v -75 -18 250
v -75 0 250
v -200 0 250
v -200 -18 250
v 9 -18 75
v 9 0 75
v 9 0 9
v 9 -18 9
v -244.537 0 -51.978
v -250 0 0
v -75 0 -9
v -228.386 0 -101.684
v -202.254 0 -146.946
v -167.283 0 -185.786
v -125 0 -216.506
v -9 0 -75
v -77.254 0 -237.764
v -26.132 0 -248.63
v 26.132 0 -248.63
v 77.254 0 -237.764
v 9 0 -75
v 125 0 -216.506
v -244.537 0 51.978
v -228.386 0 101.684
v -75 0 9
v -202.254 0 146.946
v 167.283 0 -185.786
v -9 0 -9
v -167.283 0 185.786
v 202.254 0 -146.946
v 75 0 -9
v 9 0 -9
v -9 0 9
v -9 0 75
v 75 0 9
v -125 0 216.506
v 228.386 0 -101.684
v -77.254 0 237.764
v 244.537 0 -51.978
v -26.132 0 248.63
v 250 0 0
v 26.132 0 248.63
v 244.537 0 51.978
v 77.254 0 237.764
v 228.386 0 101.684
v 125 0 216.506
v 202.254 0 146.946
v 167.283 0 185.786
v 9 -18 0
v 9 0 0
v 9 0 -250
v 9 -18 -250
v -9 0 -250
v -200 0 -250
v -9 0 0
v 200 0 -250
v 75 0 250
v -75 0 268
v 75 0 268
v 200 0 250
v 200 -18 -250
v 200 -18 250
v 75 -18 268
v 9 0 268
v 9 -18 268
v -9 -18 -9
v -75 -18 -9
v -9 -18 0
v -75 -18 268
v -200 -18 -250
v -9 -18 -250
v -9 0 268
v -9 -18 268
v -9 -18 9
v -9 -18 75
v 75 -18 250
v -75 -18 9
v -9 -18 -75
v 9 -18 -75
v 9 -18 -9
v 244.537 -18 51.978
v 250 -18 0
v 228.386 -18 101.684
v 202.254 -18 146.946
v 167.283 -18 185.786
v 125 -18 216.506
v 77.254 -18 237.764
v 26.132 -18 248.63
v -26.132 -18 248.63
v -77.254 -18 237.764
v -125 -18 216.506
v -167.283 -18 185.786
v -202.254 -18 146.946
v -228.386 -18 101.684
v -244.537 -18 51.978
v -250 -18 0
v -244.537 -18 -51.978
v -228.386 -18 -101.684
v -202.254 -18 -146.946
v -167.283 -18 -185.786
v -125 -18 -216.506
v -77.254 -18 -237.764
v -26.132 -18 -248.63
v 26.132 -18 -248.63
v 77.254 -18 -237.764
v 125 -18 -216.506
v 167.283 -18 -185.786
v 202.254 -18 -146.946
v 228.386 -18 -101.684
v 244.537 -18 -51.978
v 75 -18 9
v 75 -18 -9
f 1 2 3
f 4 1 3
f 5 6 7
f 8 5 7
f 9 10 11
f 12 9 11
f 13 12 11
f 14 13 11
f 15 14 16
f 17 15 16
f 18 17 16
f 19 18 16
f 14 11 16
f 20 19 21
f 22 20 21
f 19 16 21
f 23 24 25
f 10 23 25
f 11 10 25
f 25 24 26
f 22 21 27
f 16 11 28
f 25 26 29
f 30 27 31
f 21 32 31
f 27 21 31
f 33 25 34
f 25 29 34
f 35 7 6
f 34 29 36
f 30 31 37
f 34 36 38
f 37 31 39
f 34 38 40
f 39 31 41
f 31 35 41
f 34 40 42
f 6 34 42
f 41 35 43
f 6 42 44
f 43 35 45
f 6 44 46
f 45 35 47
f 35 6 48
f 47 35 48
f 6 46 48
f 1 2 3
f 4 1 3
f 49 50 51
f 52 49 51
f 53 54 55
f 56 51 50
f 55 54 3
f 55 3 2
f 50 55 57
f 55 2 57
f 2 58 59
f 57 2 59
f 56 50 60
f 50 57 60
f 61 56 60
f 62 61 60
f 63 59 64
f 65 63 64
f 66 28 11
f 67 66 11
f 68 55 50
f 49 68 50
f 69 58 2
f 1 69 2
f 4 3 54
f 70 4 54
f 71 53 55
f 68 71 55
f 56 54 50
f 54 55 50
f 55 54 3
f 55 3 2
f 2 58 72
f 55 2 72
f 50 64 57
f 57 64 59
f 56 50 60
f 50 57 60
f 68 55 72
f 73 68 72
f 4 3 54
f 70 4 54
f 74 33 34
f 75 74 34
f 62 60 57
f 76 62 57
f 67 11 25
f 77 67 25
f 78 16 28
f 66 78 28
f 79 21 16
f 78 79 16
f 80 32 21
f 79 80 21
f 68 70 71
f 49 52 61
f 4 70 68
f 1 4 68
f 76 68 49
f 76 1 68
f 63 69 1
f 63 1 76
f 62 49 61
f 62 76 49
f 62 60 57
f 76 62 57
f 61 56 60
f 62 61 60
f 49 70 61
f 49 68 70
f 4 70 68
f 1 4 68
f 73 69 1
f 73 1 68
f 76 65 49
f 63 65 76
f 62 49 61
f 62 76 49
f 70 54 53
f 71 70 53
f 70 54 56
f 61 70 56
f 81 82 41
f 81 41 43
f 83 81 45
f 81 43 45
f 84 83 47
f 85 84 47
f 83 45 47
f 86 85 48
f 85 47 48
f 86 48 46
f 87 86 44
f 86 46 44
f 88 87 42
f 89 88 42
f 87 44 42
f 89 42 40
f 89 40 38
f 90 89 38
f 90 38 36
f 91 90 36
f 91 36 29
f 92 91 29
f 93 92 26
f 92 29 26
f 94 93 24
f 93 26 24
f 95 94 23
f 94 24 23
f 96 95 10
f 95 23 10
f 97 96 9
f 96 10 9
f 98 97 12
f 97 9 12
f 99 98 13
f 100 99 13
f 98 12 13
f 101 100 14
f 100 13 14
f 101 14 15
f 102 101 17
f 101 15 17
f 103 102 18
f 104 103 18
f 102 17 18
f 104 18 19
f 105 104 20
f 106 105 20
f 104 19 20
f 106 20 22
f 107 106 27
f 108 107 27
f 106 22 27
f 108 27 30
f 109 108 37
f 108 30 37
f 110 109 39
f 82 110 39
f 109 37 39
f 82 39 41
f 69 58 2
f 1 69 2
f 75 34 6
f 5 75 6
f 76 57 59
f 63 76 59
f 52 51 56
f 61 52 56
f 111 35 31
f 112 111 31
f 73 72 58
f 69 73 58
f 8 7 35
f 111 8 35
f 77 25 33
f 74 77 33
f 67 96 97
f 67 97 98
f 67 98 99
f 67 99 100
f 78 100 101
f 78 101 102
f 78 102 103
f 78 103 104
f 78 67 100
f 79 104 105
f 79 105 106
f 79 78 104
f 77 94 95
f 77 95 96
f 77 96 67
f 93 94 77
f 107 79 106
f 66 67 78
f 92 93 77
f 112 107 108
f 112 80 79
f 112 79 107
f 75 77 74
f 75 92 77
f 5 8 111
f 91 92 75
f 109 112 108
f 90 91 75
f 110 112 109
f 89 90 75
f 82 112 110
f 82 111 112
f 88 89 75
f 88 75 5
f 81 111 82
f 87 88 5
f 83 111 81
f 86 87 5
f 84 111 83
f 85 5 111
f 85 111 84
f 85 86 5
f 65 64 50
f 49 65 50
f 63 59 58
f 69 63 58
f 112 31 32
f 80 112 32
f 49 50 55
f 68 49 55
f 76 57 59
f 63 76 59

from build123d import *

# Parameters (mm, degrees)
F3_DEPTH = 18
F4_DEPTH = 18
F2_R     = 250
F5_DEPTH = 18


with BuildPart() as f3:
    # F0 (on Front) → F3 (new body)
    with BuildSketch(Plane.XZ):
        Polygon((-200, -250), (200, -250), (200, 250), (75, 250), (75, 268), (9, 268), (9, 0), (-9, 0), (-9, 268), (-75, 268), (-75, 250), (-200, 250), align=None)
    extrude(amount=F3_DEPTH)


with BuildPart() as f4:
    # F1 (on Front) → F4 (new body)
    with BuildSketch(Plane.XZ):
        Polygon((9, -250), (200, -250), (200, 250), (75, 250), (75, 268), (-75, 268), (-75, 250), (-200, 250), (-200, -250), (-9, -250), (-9, 0), (9, 0), align=None)
    extrude(amount=F4_DEPTH)


with BuildPart() as f5:
    # F2 (on Front) → F5 (new body)
    with BuildSketch(Plane.XZ):
        Circle(F2_R)
        Polygon((75, 9), (75, -9), (9, -9), (9, -75), (-9, -75), (-9, -9), (-75, -9), (-75, 9), (-9, 9), (-9, 75), (9, 75), (9, 9), align=None, mode=Mode.SUBTRACT)
    extrude(amount=F5_DEPTH)


solid = Compound([f3.part, f4.part, f5.part])
